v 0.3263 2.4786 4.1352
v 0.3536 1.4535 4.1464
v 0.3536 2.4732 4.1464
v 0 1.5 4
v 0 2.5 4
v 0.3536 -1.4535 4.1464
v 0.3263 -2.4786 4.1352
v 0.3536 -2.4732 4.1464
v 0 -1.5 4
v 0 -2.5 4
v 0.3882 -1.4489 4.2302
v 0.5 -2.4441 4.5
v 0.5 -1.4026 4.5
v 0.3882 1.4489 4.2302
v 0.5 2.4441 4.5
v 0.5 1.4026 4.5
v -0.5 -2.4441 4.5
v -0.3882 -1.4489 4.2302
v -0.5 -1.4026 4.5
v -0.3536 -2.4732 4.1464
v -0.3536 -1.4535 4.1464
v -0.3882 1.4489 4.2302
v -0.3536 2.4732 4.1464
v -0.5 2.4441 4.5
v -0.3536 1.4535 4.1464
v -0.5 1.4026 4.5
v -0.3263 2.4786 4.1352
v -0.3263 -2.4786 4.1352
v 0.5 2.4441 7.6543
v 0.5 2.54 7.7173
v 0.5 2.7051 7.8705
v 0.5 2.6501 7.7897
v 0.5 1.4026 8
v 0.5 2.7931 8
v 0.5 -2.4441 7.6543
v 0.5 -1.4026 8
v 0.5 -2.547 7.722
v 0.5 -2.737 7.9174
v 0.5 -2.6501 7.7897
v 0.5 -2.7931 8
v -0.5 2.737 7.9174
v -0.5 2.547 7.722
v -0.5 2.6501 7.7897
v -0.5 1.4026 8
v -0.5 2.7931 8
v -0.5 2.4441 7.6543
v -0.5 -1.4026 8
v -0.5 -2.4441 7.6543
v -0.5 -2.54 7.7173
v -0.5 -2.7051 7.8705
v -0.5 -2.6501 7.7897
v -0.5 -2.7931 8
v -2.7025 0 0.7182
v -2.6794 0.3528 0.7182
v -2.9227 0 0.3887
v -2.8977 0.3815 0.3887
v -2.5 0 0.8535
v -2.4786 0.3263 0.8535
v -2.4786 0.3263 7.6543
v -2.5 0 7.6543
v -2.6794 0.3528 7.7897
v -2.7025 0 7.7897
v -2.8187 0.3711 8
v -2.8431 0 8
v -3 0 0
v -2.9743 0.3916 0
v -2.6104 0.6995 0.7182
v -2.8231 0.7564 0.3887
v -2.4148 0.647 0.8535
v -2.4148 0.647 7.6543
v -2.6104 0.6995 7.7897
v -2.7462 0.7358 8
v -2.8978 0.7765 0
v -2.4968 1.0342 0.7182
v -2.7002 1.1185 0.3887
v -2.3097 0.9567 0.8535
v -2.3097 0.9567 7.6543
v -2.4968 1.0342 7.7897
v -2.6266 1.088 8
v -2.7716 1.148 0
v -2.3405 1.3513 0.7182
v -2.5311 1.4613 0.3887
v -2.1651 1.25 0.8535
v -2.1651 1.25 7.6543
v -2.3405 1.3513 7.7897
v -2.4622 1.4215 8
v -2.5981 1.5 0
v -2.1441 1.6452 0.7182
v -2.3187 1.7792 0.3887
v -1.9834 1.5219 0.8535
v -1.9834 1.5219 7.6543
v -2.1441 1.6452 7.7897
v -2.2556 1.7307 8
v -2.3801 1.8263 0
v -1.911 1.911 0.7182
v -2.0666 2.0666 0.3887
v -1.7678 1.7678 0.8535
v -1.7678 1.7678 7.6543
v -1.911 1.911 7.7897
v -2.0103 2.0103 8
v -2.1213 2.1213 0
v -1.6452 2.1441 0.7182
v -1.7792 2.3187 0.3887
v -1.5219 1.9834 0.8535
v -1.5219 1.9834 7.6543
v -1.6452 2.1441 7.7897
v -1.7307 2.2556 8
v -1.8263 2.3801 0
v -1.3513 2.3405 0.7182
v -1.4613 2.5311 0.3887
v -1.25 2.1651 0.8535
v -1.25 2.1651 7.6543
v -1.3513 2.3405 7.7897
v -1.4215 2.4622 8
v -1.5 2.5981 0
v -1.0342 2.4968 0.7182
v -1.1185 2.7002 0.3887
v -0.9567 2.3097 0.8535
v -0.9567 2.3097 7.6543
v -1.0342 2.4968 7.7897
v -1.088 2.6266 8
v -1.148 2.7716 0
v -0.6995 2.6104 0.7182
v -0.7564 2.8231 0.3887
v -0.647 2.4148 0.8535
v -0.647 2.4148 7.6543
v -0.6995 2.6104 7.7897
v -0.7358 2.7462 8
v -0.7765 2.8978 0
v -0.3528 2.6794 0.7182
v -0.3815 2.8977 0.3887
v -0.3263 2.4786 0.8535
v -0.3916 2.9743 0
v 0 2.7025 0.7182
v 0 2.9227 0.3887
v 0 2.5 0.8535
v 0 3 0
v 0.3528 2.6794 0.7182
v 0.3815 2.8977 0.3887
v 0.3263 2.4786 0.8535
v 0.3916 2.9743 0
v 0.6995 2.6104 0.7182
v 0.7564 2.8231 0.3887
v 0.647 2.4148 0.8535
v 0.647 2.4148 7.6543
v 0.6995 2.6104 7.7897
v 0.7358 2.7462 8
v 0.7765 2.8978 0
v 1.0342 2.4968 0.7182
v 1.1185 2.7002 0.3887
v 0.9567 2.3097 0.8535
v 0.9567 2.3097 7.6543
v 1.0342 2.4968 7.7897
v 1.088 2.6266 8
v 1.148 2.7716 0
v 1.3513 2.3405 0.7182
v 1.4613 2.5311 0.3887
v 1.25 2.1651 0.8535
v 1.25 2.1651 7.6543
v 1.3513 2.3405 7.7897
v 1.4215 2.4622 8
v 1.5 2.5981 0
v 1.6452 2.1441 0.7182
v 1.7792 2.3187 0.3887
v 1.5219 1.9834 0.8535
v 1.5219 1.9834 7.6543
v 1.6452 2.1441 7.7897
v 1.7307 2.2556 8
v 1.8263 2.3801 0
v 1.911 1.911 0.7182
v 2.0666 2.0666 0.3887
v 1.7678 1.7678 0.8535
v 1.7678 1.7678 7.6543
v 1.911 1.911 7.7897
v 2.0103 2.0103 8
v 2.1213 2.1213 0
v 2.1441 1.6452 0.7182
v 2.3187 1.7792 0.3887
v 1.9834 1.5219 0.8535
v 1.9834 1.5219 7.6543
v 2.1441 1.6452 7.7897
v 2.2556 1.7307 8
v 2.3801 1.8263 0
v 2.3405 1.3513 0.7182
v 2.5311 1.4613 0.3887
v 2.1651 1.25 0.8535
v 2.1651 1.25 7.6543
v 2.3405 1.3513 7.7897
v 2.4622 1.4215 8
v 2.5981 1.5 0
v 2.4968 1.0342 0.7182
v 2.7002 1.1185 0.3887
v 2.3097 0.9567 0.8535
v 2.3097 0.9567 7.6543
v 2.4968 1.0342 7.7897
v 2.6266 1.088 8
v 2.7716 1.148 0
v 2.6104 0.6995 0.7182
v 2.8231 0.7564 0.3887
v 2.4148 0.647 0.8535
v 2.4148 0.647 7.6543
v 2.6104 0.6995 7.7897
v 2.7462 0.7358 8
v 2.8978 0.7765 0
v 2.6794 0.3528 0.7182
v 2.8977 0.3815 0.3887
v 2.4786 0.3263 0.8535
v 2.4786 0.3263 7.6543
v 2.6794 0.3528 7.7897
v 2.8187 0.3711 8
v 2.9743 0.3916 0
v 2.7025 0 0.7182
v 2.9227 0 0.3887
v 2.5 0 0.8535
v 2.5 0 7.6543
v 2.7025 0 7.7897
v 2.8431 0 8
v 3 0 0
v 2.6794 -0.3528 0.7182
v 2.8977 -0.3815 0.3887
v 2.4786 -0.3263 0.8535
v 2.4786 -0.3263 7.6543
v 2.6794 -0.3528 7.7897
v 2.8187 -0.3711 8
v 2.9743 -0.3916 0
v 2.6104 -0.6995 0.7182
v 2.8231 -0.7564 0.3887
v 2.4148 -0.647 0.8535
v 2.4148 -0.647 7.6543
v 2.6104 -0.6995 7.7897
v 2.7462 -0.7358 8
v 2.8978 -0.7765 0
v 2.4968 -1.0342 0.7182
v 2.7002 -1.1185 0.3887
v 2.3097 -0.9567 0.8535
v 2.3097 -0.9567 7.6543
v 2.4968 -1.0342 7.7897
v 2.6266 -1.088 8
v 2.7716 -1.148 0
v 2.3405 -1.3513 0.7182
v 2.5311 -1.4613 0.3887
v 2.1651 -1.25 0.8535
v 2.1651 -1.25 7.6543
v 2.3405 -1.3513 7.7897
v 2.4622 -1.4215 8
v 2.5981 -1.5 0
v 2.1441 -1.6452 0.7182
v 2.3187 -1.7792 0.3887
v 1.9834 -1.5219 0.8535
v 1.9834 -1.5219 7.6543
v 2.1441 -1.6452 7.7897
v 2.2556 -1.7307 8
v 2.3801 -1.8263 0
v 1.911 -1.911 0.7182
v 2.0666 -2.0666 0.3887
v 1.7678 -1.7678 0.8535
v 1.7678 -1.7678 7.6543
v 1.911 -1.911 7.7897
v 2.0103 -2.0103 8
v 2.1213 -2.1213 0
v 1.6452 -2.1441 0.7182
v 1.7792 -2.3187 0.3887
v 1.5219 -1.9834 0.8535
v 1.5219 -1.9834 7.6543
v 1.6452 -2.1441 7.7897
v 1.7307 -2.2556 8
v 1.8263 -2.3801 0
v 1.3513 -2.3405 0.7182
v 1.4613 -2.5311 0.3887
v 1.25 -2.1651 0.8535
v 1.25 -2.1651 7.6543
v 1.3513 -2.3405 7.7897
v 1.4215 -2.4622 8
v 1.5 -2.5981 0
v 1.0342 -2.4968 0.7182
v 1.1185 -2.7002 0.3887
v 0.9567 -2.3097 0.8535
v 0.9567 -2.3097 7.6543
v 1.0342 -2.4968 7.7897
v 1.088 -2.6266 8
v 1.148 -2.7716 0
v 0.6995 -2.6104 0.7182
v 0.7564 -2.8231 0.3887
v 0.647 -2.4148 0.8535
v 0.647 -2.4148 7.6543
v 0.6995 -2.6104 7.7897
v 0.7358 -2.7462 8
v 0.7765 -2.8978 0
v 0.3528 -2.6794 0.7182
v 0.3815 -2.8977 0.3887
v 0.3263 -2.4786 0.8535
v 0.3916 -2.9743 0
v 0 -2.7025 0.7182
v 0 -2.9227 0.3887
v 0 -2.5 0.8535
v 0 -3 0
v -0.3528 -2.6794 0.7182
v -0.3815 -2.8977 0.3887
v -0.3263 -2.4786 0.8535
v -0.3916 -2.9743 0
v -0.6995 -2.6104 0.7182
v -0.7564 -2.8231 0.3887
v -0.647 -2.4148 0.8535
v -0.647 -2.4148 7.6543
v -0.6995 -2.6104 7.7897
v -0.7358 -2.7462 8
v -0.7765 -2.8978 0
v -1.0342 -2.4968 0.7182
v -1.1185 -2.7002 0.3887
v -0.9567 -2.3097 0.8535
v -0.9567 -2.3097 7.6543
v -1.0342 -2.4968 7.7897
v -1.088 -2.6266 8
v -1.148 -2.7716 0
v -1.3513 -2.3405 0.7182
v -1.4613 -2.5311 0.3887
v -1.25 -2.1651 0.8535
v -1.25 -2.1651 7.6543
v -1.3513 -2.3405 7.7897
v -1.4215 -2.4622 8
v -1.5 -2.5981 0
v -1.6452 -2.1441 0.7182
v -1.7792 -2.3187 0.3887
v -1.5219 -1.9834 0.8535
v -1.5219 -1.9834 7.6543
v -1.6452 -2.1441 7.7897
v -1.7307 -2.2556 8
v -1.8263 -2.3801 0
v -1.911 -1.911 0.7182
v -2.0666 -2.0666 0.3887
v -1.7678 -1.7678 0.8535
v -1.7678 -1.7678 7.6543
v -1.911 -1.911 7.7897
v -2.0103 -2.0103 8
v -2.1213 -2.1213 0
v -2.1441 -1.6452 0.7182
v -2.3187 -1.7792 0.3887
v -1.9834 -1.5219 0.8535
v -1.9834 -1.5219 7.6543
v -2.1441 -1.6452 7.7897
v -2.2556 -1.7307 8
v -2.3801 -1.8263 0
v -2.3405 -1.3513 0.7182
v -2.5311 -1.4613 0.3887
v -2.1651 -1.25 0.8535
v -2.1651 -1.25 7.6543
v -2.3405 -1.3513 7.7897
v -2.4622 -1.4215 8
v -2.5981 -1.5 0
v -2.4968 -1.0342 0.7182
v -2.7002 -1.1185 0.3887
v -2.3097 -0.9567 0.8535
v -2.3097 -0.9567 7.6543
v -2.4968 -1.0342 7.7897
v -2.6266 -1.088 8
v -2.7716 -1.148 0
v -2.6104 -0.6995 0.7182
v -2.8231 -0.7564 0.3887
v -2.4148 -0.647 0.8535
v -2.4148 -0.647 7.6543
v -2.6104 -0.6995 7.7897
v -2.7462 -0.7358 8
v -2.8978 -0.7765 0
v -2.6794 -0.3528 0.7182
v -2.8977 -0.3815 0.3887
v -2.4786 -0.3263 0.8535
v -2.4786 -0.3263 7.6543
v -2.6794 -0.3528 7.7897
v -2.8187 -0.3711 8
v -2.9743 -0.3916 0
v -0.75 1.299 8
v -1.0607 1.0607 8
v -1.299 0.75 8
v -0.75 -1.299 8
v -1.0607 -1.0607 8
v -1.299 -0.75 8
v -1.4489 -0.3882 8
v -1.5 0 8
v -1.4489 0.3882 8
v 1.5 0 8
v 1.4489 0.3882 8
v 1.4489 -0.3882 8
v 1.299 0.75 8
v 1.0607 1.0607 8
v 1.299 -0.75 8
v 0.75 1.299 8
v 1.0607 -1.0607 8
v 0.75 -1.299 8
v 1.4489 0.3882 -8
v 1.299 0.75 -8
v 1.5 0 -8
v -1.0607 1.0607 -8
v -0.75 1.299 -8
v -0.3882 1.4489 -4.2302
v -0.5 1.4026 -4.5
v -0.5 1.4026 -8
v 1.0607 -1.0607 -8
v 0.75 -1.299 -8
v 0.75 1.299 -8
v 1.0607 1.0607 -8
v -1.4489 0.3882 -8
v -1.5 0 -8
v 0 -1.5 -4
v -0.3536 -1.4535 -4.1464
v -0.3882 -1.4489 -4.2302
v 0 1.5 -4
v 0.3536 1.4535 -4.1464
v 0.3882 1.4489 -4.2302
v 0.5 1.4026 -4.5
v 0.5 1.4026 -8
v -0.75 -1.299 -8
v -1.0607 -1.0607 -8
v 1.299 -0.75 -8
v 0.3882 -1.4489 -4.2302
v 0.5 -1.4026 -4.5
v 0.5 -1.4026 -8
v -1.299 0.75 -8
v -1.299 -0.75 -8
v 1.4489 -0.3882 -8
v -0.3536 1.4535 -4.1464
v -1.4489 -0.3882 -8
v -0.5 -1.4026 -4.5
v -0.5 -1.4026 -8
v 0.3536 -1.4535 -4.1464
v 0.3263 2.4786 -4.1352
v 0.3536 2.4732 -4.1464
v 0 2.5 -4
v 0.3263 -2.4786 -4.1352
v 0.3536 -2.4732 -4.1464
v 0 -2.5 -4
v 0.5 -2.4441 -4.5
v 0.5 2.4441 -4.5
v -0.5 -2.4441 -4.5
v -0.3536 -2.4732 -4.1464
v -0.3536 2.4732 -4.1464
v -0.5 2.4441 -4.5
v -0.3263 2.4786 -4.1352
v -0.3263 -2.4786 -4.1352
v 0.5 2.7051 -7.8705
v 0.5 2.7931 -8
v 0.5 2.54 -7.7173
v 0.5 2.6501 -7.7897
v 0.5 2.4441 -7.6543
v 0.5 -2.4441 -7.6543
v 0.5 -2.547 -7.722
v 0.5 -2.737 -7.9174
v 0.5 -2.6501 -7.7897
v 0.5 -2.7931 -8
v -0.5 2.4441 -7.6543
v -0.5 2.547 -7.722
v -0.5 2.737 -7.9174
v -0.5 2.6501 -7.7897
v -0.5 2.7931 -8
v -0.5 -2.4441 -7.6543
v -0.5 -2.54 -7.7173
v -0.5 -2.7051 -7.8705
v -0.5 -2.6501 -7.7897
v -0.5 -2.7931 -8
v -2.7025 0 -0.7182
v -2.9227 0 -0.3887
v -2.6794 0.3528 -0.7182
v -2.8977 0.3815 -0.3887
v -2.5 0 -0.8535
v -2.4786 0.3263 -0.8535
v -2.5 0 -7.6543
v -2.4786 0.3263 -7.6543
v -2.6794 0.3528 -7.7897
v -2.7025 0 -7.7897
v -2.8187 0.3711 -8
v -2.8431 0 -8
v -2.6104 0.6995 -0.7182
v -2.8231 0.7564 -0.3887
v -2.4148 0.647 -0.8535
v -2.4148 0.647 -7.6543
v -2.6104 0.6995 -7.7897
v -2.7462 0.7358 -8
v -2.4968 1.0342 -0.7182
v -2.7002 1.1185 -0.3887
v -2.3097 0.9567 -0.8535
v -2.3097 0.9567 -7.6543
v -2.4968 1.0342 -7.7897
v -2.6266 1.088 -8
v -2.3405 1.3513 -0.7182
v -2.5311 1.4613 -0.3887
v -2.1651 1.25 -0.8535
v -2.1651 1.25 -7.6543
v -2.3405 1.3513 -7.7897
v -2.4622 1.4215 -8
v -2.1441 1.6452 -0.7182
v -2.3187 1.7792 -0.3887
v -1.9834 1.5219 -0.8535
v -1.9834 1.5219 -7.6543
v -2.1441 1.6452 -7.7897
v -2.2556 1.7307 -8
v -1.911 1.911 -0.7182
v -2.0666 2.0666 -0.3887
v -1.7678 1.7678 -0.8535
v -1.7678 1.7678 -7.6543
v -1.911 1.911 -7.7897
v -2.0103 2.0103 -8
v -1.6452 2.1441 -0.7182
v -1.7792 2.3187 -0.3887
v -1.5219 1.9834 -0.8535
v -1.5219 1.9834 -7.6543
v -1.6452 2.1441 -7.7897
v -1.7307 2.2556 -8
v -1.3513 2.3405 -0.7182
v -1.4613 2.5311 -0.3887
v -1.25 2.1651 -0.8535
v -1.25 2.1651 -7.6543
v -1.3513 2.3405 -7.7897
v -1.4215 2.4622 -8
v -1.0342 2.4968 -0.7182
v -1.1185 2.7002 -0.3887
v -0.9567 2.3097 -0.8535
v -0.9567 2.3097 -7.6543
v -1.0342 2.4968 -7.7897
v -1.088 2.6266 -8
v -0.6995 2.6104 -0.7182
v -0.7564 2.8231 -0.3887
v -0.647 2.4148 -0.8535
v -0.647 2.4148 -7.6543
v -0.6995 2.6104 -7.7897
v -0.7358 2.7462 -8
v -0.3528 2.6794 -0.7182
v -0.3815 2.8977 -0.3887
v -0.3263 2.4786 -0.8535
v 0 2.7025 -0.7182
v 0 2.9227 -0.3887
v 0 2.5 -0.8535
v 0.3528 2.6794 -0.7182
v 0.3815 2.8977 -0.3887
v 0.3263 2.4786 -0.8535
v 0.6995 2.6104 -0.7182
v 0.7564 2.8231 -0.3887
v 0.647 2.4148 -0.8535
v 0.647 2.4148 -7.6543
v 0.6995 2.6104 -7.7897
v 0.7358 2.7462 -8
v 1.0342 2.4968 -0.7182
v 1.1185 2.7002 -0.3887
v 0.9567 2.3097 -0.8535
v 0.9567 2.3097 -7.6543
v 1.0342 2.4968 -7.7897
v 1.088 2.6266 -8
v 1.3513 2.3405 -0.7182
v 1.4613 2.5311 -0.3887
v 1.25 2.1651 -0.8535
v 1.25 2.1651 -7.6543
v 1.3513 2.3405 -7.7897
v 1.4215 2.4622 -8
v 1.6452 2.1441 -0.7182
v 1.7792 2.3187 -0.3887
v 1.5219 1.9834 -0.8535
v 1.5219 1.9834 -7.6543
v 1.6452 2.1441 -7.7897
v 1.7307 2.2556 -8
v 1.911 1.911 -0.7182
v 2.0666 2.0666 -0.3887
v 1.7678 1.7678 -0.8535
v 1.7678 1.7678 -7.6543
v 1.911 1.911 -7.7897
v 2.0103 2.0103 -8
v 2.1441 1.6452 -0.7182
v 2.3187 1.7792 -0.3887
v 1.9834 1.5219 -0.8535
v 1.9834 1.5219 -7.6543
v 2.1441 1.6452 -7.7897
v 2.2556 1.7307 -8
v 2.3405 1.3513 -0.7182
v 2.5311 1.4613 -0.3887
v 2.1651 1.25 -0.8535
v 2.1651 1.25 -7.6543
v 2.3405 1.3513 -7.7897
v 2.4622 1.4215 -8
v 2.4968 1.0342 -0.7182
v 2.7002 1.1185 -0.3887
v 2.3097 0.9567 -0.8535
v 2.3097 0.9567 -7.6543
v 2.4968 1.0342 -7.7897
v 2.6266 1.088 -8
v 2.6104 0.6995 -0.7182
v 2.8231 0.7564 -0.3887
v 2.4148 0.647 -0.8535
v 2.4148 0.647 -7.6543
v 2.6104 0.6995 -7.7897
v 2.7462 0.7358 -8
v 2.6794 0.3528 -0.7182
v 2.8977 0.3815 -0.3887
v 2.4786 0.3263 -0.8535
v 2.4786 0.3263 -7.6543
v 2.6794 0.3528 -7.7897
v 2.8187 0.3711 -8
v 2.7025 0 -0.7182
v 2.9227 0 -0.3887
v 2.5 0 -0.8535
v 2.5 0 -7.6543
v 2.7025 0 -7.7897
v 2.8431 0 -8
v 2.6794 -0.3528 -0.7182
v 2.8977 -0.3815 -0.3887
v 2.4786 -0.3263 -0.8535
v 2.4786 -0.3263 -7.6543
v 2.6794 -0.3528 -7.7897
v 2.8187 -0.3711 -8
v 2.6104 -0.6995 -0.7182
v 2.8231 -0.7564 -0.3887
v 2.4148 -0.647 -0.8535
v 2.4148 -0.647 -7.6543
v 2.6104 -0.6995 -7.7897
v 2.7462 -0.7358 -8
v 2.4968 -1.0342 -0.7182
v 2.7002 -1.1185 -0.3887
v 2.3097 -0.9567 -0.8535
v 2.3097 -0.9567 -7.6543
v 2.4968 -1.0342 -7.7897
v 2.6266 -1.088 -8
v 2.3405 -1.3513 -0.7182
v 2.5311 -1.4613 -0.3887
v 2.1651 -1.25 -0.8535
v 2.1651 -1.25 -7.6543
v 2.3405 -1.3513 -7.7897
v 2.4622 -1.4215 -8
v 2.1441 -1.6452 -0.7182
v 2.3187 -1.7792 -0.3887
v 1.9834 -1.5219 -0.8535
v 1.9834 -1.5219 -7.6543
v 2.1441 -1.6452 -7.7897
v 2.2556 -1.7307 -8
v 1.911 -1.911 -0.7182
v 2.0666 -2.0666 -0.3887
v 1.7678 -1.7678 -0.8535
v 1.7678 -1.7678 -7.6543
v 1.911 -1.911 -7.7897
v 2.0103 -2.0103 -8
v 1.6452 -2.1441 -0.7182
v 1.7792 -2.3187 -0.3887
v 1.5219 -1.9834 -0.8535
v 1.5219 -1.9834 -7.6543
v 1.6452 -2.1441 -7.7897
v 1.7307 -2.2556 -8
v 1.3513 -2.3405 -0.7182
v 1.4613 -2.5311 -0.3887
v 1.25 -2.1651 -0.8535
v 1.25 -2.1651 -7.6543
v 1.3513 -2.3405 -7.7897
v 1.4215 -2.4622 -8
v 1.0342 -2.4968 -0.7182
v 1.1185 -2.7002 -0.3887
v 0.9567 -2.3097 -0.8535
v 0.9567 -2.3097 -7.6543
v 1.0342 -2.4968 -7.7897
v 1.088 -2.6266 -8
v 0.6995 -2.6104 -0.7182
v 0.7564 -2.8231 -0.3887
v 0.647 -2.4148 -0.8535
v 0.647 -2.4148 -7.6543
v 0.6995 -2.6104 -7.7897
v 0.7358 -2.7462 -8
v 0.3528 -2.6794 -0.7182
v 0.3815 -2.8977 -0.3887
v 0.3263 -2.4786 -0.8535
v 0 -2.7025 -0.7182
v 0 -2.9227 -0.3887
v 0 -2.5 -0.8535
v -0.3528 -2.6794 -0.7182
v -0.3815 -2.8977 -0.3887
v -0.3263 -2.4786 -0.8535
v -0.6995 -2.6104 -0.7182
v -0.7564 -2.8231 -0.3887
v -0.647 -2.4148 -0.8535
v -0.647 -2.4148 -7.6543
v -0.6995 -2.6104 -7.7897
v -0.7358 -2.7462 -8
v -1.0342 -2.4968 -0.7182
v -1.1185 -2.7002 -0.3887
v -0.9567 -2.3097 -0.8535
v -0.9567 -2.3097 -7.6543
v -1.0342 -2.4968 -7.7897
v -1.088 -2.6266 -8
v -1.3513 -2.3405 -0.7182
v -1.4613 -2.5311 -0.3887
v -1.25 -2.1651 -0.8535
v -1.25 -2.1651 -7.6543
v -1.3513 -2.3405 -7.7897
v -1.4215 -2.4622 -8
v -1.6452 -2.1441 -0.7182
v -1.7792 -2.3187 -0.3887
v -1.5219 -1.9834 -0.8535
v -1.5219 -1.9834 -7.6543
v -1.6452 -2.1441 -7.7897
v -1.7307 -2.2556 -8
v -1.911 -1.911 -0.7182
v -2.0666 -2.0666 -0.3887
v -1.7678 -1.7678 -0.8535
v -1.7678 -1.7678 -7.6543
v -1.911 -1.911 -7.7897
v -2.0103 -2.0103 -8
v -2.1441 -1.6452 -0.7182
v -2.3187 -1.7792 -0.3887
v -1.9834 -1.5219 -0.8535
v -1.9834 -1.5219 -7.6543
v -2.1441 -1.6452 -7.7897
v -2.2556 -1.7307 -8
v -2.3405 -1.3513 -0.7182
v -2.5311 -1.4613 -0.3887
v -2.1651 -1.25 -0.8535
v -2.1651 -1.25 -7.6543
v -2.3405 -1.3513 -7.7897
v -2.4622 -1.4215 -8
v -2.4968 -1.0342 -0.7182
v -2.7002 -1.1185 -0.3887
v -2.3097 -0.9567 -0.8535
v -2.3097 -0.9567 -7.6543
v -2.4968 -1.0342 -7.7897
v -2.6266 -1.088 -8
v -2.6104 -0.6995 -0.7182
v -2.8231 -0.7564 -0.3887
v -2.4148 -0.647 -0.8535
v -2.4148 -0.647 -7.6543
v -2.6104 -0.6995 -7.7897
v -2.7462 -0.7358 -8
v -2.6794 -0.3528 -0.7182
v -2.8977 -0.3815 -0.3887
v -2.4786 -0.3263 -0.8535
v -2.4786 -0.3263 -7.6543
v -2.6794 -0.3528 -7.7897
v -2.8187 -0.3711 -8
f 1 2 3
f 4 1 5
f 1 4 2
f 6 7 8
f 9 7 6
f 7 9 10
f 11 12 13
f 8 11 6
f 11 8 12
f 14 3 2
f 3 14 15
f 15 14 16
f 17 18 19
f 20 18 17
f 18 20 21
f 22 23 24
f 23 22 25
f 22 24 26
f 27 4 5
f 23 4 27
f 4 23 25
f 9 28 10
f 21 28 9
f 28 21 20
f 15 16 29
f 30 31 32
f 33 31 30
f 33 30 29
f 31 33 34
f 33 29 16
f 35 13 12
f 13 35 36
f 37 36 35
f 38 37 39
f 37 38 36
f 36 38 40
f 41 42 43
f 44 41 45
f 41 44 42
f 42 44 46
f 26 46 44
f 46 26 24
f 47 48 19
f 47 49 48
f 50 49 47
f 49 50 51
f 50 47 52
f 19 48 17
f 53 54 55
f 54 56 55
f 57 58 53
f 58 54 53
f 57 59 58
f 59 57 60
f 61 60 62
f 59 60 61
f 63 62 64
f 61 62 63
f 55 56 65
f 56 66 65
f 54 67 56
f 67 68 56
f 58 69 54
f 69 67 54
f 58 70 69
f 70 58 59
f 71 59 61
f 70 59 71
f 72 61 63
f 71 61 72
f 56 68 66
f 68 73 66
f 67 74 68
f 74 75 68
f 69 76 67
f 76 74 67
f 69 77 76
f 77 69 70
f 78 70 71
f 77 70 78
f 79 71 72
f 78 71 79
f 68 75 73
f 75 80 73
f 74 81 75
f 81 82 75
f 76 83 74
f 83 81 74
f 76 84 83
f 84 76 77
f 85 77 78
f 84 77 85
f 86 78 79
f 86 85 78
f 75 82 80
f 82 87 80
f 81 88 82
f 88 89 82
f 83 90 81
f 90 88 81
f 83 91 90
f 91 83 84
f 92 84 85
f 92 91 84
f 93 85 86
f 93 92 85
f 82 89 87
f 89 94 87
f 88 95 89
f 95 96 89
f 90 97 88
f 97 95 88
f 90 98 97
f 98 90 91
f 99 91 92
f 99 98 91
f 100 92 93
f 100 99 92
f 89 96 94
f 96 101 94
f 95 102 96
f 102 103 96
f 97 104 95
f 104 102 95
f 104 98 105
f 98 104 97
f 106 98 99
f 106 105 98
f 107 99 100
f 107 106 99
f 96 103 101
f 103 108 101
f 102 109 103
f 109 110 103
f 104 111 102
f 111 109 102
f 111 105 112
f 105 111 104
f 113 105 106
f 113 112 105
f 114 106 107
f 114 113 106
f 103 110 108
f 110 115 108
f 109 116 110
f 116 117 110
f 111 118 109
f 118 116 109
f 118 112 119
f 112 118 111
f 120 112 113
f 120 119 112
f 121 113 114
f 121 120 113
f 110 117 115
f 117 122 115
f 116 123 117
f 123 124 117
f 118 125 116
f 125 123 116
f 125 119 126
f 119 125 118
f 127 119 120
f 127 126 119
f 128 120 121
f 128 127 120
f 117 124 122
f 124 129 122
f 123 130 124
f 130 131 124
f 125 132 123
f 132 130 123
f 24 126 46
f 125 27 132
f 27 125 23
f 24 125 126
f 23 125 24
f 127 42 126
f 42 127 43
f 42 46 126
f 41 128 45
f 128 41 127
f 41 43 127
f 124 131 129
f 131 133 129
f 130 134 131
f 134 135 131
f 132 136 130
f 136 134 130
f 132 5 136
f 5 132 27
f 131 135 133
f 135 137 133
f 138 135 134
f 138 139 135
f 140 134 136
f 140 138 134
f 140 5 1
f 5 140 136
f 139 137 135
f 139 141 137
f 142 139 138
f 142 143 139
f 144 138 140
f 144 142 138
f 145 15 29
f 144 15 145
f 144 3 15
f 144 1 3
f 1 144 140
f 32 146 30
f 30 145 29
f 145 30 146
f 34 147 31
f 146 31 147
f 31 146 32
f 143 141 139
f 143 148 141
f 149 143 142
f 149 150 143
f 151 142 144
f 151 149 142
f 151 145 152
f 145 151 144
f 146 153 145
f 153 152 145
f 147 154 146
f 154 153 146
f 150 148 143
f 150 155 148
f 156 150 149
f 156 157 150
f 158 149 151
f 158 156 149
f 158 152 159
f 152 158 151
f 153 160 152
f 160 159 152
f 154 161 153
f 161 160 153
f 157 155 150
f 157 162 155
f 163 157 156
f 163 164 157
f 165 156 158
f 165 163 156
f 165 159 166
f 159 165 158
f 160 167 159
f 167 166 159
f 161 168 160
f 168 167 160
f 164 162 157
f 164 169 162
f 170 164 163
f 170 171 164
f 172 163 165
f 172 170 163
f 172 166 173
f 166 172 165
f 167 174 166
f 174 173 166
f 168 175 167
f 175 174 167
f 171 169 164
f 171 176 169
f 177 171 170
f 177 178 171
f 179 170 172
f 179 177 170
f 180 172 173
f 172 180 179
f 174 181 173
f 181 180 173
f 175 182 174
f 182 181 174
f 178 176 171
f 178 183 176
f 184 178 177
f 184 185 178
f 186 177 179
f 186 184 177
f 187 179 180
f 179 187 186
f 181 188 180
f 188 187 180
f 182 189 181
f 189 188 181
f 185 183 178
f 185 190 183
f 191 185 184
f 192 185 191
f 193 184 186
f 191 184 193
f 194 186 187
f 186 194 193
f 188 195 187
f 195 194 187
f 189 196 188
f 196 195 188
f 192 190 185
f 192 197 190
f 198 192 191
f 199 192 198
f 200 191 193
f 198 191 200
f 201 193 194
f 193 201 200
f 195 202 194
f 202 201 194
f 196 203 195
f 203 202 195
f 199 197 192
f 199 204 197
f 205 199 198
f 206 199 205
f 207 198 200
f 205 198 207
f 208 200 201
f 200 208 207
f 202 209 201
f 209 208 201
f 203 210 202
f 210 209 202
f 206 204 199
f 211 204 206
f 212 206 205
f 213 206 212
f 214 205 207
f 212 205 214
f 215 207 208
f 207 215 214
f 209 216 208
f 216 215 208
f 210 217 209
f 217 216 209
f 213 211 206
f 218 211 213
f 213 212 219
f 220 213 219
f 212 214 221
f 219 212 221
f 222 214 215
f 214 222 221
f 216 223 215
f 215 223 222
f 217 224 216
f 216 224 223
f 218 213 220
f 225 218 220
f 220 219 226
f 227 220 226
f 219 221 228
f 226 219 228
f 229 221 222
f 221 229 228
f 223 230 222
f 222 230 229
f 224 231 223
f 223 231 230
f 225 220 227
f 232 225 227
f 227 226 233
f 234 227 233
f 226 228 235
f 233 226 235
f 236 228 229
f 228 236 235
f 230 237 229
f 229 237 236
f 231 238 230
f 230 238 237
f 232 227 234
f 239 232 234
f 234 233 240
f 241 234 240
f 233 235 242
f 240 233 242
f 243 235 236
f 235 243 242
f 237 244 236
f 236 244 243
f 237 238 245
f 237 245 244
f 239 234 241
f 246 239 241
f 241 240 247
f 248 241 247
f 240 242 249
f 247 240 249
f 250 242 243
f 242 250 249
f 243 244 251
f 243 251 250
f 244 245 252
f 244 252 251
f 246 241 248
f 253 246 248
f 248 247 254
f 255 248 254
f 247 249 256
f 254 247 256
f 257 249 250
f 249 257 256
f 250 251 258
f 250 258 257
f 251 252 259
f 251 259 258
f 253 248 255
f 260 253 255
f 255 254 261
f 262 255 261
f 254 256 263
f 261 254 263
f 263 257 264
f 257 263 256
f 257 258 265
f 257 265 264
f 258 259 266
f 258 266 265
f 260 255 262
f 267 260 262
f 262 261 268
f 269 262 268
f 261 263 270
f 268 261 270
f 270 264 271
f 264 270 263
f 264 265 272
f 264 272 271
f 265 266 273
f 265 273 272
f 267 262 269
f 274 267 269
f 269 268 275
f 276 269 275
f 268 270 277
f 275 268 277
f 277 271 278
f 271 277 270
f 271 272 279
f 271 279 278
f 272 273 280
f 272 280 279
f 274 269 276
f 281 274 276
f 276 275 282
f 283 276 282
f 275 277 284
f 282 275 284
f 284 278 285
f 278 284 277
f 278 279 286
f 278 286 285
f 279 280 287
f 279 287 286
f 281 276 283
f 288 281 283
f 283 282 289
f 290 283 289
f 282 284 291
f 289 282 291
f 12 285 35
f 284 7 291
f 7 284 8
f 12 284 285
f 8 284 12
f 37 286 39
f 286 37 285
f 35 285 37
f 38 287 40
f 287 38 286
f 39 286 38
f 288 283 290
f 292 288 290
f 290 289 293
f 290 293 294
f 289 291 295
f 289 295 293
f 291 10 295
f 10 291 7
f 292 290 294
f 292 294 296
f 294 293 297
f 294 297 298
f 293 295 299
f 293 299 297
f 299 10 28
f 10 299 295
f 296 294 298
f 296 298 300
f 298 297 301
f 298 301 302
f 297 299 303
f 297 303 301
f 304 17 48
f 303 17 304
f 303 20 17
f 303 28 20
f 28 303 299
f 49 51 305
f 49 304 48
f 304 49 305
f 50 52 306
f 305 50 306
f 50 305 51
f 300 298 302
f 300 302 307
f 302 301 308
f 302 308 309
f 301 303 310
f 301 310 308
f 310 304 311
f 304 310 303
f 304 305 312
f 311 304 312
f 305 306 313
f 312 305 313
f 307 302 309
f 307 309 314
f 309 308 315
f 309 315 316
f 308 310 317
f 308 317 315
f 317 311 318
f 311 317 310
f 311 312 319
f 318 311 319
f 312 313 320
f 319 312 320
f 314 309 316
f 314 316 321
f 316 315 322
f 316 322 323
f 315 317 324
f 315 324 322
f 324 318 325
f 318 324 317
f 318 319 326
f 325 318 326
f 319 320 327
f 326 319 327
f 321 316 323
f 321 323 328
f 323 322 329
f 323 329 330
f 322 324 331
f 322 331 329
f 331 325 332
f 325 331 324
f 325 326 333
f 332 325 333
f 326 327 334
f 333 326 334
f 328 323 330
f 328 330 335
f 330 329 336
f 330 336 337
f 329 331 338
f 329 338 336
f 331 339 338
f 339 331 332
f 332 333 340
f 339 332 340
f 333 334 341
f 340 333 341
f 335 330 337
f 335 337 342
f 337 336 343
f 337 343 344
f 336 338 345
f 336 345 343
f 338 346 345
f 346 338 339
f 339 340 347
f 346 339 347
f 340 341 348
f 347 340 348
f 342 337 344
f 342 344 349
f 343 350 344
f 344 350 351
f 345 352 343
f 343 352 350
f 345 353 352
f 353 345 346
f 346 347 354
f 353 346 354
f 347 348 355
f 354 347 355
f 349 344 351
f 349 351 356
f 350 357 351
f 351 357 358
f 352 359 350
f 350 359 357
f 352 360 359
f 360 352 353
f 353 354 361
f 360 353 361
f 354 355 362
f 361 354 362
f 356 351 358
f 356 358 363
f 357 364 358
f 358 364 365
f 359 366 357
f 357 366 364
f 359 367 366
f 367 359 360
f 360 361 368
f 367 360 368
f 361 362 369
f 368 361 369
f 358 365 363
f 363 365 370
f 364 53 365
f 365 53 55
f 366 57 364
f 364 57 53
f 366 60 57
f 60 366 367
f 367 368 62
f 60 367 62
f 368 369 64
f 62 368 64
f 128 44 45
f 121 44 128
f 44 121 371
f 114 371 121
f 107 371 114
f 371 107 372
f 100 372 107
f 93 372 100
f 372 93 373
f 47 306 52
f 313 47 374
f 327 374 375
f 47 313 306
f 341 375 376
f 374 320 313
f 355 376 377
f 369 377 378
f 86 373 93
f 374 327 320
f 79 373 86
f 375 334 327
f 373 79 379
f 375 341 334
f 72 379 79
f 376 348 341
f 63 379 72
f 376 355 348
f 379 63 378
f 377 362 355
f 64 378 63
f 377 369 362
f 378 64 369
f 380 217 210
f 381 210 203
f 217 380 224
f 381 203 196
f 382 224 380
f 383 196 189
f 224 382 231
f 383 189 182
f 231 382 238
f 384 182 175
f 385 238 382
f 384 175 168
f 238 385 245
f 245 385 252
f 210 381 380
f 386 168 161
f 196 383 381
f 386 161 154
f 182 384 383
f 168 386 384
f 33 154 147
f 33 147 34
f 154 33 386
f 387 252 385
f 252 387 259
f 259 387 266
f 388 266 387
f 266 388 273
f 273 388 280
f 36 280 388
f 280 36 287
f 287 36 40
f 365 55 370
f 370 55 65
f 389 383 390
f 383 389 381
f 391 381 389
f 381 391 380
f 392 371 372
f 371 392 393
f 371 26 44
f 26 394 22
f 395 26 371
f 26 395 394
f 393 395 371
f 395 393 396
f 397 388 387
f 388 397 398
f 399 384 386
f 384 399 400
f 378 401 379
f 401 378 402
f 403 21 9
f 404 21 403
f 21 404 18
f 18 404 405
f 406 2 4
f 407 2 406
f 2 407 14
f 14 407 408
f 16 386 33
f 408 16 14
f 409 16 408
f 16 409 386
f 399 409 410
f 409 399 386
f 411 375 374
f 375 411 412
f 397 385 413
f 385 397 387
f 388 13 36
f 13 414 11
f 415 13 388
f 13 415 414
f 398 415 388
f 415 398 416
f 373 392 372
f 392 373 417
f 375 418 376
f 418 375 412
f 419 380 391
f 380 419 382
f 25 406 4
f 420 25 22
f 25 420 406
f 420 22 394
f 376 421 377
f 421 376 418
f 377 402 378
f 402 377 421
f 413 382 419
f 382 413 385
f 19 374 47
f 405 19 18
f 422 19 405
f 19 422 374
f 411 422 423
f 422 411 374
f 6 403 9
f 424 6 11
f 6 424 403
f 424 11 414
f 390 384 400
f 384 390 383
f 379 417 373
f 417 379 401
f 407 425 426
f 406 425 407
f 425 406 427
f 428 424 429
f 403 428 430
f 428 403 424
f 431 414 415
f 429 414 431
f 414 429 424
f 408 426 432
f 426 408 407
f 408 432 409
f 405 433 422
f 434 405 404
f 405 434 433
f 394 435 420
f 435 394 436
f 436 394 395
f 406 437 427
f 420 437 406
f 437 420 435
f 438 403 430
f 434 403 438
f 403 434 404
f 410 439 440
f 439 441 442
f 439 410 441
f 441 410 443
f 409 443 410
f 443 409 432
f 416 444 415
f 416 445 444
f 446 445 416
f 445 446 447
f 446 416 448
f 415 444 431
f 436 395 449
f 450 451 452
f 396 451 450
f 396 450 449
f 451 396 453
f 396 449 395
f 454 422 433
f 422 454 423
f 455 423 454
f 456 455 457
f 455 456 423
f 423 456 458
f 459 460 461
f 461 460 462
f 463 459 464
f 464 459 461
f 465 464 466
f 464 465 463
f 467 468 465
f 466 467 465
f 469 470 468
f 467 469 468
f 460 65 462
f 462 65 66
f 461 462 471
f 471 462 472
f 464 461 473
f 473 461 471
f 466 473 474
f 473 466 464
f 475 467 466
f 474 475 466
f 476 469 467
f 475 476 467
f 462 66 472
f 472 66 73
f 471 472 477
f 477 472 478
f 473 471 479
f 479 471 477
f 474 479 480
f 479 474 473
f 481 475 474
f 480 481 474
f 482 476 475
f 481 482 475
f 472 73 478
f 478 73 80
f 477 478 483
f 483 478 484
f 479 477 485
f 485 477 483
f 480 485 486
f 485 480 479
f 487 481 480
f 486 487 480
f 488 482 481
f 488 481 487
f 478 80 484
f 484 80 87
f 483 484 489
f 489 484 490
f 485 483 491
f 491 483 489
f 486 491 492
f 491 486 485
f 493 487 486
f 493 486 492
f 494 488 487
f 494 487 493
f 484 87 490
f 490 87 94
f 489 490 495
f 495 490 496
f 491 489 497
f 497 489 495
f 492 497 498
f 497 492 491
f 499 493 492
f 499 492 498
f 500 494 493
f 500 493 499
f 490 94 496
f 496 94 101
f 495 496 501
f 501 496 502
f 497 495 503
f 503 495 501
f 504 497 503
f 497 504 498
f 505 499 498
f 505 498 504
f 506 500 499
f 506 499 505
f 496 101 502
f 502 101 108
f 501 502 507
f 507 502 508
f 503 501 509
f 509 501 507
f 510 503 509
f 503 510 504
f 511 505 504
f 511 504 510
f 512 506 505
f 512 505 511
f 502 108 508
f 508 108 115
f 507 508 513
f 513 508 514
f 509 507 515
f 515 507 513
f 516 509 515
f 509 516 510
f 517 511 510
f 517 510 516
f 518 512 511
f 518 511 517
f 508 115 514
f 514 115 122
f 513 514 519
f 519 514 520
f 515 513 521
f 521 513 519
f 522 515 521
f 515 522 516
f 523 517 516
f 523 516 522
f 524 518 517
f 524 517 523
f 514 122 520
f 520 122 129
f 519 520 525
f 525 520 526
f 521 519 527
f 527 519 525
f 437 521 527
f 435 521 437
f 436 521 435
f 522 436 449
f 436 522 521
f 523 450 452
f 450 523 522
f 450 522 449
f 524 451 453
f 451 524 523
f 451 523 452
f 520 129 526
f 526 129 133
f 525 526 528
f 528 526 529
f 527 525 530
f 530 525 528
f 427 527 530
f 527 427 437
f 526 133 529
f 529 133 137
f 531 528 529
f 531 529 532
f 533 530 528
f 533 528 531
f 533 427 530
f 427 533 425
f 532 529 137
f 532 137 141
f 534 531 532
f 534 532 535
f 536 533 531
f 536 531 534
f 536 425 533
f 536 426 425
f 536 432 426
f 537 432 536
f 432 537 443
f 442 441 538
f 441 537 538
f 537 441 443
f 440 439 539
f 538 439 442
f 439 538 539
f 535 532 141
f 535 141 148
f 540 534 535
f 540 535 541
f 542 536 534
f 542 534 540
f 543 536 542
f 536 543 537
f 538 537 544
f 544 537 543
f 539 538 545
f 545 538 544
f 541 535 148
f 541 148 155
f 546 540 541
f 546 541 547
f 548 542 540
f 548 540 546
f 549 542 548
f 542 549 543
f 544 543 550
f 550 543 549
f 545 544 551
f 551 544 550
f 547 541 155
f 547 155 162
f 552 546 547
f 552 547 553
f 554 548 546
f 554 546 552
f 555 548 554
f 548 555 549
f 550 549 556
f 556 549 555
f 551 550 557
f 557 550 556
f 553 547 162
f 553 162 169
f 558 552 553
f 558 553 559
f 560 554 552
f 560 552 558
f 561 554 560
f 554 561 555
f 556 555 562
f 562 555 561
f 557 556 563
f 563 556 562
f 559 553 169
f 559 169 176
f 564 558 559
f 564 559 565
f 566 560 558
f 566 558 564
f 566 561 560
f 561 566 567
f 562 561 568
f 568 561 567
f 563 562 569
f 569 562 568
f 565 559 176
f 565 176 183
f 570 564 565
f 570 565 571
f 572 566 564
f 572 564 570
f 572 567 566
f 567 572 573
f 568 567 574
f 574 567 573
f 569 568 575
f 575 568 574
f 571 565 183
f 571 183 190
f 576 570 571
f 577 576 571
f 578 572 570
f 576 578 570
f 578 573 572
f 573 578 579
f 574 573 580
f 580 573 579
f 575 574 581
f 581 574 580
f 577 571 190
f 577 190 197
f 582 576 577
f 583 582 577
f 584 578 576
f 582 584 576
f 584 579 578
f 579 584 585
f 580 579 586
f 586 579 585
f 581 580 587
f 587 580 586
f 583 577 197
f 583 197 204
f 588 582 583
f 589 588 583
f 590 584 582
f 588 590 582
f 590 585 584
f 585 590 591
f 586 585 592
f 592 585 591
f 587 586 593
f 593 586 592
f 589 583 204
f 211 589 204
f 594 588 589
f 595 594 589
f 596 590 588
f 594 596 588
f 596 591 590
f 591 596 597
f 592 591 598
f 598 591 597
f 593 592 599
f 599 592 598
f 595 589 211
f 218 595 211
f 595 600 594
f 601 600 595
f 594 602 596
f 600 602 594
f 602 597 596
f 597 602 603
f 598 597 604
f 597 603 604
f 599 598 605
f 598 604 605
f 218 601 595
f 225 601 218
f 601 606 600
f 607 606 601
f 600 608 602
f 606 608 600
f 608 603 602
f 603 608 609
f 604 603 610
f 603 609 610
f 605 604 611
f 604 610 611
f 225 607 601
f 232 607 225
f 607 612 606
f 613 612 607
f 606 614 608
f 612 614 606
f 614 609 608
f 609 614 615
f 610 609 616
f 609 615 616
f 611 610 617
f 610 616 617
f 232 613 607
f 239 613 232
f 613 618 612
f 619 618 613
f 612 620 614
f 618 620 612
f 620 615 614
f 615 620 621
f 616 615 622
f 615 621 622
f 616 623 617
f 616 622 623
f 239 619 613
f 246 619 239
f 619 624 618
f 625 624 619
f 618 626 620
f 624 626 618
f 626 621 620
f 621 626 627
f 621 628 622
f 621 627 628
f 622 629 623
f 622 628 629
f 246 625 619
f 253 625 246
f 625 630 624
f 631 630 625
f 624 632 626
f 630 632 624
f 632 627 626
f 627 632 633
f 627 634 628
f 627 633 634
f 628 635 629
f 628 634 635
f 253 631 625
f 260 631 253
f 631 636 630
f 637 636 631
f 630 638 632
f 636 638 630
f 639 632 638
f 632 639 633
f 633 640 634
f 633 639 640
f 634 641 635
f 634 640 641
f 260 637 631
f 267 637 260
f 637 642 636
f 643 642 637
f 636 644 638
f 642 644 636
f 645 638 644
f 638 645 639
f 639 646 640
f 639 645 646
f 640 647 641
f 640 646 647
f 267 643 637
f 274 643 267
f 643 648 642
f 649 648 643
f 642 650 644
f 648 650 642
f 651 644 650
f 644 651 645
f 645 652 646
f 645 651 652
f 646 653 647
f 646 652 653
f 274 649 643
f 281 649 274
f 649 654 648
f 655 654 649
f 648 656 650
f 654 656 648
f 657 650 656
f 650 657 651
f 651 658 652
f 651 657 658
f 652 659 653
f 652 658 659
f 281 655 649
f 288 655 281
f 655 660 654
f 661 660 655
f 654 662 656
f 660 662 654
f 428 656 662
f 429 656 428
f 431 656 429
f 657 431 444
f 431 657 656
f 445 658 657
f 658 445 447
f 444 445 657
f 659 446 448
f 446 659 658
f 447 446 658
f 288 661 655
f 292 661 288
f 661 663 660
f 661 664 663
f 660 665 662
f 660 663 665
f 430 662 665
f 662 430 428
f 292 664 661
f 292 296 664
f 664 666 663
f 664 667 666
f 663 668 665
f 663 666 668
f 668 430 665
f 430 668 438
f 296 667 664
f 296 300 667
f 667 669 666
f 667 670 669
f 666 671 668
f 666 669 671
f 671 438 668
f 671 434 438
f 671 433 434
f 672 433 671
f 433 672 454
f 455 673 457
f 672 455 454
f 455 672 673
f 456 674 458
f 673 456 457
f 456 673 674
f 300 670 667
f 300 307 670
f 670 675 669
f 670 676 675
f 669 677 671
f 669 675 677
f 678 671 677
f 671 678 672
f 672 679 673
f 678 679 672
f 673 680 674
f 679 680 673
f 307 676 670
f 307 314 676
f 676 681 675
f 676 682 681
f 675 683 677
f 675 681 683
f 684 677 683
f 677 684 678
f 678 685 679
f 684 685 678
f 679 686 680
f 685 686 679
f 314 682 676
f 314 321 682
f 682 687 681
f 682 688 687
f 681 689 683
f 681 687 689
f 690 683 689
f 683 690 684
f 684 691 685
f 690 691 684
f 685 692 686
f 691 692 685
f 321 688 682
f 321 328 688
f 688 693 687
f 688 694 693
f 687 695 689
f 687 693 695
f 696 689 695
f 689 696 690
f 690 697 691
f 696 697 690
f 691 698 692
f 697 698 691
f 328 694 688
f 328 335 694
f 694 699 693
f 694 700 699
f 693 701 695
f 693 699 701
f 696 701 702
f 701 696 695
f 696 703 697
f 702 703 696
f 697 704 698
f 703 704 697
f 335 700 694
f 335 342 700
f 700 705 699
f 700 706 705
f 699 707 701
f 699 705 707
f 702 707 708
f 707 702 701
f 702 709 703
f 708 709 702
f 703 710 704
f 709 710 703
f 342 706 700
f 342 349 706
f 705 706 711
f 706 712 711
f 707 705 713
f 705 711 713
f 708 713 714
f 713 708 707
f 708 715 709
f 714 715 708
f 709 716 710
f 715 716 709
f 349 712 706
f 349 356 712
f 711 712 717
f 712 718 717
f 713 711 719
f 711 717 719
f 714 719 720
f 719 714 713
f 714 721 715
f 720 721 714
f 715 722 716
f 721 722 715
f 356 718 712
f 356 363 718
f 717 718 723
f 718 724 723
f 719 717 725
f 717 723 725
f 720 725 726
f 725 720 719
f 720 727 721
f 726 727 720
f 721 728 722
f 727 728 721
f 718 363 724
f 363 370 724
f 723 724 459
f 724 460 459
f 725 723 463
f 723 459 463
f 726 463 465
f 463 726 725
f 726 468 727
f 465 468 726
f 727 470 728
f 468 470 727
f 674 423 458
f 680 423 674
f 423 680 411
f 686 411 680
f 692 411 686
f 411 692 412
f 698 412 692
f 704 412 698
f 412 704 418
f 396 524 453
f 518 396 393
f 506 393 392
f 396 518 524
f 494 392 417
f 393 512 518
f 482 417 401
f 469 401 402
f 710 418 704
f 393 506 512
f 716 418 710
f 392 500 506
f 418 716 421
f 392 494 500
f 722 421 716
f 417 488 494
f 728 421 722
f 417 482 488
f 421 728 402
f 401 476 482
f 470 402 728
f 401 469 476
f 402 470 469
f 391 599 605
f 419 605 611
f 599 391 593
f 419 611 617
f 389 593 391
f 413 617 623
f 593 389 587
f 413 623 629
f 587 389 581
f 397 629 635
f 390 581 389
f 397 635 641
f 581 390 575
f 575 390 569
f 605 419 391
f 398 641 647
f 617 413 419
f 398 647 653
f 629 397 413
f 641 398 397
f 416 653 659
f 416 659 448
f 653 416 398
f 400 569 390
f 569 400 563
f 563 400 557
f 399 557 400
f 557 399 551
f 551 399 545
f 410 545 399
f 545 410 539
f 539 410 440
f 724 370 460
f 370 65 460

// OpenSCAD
/*
 * connector_pin.scad
 */

use <MCAD/2Dshapes.scad>;

/*
 * This creates a connection pin that will be used to connect the different atoms together. The design aims
 * to be easily printable, easy to pull in and out, but also provide sufficent grip to hold the parts together.
 * The defauult parameters should be suitable for most cases, but the parameter can be overriden as needed.
 */
module connection_pin(
  height = 16,        // total height of the pin
  radius = 2.5,       // radius of the pin shaft
  inner_radius = 1.5, // radius of the inner hole
  bump_width = 0.5,   // the width of the bump out (from the shaft to outermost point)
  bump_height = 1.75, // the total height of the middle bump (from where it first extends beyond the shaft)
  slot_width = 1      // the width of the slot
) {
  assert(inner_radius < radius, "inner_radius must be less than nominal_radius.");

  half_pin(height / 2, radius, inner_radius, bump_width, bump_height, slot_width);
  mirror([0, 0, 1]) {
    half_pin(height / 2, radius, inner_radius, bump_width, bump_height, slot_width);
  }

  // Sub modules below //

  /*
   * Creates the upper half of the pin that will then be mirrored.
   */
  module half_pin(height, radius, inner_radius, bump_width, bump_height, slot_width) {
    difference() {
      rotate_extrude() {
        outer_profile(height, radius, bump_width, bump_height);
      };
      cylinder(h = 3 * height, r1 = inner_radius, r2 = inner_radius, center = true);
      translate([0, 0, height / 2 + slot_width / 2]) {
        relief_slot(slot_width, height / 2, radius + bump_width);
      }
    }
  }

  /*
   * Creates the oouter profile of the pin that can be rotationally extruded.
   */
  module outer_profile(height, radius, bump_width, bump_height) {

    bump_radius = radius_from_height_and_chord(bump_width, bump_height);

    difference() {
      union() {
        translate([radius + bump_width - bump_radius, 0, 0]) {
          pieSlice(bump_radius, 0, 90);
        }
        square(size = [radius, height], center = false);
        translate([radius + bump_width - bump_radius, height + (bump_radius / 2), 0]) {
          pieSlice(bump_radius, 270, 360);
        }
      };
      // We remove this square from the above to clean up the partial bump at the top
      translate([0, height, 0]) {
        square(radius + bump_width, center = false);
      }
    }
  }

  /*
   * Creates the slot that is removed froom both ends.
   */
  module relief_slot(width, length, max_pin_radius) {
    union() {
      rotate([90, 0, 0]) {
        cylinder(h = 2 * max_pin_radius, r1 = width / 2, r2 = width / 2, center = true);
      }
      translate([0, 0, length / 2]) {
        cube([width, 2 * max_pin_radius, length], center = true);
      }
    }
  }

  /*
   * Given the chord length and height of a circular segment we compute the radius
   * https://en.wikipedia.org/wiki/Circular_segment#Radius_and_central_angle
   * TODO: move this to a utility file
   */
  function radius_from_height_and_chord(h, c) =
    assert(h > 0, "radius_from_height_and_chord: height must be positive.")
    assert(c > 0, "radius_from_height_and_chord: chord length must be positive.")
    (c * c) / (8 * h) + (h / 2);
}


// Just hear for testing...
$fa = 1;
$fs = 0.4;
connection_pin();
